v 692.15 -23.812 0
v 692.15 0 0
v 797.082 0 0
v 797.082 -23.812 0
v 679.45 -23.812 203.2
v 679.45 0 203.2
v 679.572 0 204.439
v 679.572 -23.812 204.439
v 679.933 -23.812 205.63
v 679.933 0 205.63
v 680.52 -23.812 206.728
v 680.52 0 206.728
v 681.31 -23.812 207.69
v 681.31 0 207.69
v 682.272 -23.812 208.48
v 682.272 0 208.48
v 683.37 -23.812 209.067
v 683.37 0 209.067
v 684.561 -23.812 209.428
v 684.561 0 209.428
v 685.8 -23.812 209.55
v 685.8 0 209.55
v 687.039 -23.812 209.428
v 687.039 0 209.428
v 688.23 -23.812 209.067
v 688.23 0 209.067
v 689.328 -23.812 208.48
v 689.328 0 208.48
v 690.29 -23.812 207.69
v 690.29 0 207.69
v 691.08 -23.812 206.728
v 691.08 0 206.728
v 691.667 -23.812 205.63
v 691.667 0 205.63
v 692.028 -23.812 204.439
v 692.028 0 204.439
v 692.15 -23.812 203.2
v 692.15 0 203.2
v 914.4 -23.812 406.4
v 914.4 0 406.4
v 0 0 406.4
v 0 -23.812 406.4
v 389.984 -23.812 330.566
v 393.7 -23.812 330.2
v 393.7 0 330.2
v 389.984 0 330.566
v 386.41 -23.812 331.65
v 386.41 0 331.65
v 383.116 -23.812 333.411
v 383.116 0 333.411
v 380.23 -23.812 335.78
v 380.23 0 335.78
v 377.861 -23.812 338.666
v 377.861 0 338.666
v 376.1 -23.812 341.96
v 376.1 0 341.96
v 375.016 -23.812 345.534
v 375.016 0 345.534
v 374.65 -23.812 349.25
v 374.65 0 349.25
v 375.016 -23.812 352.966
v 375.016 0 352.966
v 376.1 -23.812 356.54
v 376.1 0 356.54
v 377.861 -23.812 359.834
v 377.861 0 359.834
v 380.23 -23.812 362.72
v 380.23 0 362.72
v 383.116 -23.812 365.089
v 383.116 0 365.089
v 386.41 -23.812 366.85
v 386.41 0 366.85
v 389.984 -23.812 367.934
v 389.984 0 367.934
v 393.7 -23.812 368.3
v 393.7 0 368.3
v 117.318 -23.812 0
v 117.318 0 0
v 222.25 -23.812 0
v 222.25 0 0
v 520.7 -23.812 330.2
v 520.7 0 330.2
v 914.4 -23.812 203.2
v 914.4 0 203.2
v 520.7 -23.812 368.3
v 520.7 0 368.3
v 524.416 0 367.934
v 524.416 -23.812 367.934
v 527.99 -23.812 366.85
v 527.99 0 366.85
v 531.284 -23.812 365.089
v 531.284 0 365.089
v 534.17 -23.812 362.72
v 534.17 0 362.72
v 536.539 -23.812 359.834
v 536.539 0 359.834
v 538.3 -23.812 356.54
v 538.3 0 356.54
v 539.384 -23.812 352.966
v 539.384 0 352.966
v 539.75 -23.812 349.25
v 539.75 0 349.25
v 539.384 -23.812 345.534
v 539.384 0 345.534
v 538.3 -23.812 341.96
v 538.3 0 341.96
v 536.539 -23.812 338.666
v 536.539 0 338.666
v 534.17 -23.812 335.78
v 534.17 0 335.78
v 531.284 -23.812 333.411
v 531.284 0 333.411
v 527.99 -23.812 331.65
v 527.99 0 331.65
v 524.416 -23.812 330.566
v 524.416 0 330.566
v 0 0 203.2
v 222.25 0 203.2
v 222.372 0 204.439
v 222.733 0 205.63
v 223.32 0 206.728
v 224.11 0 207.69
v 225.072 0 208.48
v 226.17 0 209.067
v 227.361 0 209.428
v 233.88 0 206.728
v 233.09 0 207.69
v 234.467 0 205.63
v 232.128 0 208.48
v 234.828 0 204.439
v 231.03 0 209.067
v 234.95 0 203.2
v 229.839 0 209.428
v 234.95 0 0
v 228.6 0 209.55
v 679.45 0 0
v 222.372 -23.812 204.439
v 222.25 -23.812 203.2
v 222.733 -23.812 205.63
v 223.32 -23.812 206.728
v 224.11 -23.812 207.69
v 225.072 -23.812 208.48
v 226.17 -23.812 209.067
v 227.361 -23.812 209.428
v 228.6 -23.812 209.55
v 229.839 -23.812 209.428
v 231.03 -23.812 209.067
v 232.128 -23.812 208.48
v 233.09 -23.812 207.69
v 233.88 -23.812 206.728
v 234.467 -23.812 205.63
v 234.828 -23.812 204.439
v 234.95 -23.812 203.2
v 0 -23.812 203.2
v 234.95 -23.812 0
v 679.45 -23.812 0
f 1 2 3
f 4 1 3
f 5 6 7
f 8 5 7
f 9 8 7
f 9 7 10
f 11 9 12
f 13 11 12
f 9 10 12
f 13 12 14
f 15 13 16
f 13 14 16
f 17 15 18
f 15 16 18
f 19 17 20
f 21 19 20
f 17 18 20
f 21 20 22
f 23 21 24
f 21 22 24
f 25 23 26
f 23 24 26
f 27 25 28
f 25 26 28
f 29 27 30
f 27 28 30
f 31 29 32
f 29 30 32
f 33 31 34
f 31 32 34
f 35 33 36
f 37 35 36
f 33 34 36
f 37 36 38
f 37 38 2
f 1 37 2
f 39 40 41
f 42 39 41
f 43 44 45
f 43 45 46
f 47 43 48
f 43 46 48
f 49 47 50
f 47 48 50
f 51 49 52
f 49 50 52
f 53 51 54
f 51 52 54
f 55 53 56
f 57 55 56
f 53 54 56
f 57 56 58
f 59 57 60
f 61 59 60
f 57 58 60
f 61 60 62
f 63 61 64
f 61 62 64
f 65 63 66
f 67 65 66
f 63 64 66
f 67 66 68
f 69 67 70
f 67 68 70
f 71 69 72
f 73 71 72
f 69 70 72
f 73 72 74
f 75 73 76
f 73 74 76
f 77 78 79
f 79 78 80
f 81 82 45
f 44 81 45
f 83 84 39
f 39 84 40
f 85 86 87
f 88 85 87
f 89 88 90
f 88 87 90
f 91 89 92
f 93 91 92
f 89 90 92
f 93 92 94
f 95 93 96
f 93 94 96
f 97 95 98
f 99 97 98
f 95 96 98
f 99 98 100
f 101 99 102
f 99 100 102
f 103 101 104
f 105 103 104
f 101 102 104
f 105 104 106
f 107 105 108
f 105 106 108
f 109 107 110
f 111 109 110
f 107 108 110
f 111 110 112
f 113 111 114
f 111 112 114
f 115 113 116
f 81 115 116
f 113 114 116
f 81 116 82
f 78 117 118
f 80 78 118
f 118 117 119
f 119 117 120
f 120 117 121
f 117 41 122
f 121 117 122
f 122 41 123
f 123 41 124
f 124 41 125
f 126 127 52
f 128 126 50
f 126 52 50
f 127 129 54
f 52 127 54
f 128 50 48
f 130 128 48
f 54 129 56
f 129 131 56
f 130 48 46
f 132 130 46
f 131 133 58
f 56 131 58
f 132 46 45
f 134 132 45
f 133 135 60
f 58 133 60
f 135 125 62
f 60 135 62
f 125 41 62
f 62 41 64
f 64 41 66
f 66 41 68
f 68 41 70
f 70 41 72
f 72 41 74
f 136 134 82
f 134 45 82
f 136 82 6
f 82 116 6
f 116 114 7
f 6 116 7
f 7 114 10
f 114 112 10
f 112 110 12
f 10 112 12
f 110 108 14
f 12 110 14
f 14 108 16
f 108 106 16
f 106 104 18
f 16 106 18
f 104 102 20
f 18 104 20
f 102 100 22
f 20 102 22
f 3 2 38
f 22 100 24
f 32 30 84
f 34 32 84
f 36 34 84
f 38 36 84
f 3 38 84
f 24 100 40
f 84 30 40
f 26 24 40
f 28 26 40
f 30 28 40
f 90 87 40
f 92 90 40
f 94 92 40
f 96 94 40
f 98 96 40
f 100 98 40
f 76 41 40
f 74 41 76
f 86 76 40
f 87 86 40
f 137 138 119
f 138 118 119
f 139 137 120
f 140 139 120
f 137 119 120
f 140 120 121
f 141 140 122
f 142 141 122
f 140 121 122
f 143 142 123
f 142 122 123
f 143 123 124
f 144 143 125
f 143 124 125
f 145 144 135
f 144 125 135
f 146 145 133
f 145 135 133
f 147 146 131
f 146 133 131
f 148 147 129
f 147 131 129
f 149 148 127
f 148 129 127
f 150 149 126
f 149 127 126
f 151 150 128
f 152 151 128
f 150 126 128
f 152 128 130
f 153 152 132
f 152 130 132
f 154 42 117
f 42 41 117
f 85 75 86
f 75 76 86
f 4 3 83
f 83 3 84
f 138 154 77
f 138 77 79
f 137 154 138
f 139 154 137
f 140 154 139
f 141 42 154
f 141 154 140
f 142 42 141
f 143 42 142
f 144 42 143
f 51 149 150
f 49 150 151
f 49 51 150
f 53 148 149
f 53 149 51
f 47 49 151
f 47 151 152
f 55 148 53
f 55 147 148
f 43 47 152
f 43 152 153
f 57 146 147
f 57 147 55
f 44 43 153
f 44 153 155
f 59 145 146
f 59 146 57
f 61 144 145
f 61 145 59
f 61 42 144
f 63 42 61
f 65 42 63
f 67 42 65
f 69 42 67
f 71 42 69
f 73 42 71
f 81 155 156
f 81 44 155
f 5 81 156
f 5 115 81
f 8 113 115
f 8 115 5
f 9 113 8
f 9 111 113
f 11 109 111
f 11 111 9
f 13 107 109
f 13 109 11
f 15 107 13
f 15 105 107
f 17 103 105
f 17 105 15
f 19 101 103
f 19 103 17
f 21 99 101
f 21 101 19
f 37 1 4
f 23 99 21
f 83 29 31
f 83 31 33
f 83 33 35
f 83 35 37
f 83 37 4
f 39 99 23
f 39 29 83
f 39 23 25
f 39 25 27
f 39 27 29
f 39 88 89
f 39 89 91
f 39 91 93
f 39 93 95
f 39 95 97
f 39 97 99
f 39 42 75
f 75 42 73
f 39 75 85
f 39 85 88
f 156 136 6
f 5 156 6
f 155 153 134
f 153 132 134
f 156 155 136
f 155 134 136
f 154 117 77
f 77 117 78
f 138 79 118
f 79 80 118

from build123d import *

# Parameters (mm, degrees)
F2_DEPTH = 11.90625
F3_DEPTH = 11.90625


# Not quite as in the source:
# - a variable given as a bare number and used for a length is read in inches; the dataset says mm whatever the document's units were


with BuildPart() as f2:
    # F1 (on Front) → F2 (new body)
    with BuildSketch(Plane.XZ):
        with BuildLine():
            Line((914.4, 406.4), (0, 406.4))
            Line((0, 406.4), (0, 203.2))
            Line((0, 203.2), (117.3175746993, 0))
            Line((117.3175746993, 0), (222.25, 0))
            Line((222.25, 0), (222.25, 203.2))
            ThreePointArc((222.25, 203.2), (228.6, 209.55), (234.95, 203.2))
            Line((234.95, 203.2), (234.95, 0))
            Line((234.95, 0), (679.45, 0))
            Line((679.45, 0), (679.45, 203.2))
            ThreePointArc((679.45, 203.2), (685.8, 209.55), (692.15, 203.2))
            Line((692.15, 203.2), (692.15, 0))
            Line((692.15, 0), (797.0824253007, 0))
            Line((797.0824253007, 0), (914.4, 203.2))
            Line((914.4, 203.2), (914.4, 406.4))
        make_face()
        with BuildLine():
            Line((393.7, 368.3), (457.2, 368.3))
            Line((457.2, 368.3), (520.7, 368.3))
            ThreePointArc((520.7, 368.3), (539.75, 349.25), (520.7, 330.2))
            Line((520.7, 330.2), (457.2, 330.2))
            Line((457.2, 330.2), (393.7, 330.2))
            ThreePointArc((393.7, 330.2), (374.65, 349.25), (393.7, 368.3))
        make_face(mode=Mode.SUBTRACT)
    extrude(amount=F2_DEPTH)

    # F3 (add): a face of the model
    f3_faces = [f2.faces().sort_by_distance(p)[0] for p in [
        (457.2, -11.90625, 211.7591892525),
    ]]
    extrude(f3_faces, amount=F3_DEPTH)


solid = f2.part
